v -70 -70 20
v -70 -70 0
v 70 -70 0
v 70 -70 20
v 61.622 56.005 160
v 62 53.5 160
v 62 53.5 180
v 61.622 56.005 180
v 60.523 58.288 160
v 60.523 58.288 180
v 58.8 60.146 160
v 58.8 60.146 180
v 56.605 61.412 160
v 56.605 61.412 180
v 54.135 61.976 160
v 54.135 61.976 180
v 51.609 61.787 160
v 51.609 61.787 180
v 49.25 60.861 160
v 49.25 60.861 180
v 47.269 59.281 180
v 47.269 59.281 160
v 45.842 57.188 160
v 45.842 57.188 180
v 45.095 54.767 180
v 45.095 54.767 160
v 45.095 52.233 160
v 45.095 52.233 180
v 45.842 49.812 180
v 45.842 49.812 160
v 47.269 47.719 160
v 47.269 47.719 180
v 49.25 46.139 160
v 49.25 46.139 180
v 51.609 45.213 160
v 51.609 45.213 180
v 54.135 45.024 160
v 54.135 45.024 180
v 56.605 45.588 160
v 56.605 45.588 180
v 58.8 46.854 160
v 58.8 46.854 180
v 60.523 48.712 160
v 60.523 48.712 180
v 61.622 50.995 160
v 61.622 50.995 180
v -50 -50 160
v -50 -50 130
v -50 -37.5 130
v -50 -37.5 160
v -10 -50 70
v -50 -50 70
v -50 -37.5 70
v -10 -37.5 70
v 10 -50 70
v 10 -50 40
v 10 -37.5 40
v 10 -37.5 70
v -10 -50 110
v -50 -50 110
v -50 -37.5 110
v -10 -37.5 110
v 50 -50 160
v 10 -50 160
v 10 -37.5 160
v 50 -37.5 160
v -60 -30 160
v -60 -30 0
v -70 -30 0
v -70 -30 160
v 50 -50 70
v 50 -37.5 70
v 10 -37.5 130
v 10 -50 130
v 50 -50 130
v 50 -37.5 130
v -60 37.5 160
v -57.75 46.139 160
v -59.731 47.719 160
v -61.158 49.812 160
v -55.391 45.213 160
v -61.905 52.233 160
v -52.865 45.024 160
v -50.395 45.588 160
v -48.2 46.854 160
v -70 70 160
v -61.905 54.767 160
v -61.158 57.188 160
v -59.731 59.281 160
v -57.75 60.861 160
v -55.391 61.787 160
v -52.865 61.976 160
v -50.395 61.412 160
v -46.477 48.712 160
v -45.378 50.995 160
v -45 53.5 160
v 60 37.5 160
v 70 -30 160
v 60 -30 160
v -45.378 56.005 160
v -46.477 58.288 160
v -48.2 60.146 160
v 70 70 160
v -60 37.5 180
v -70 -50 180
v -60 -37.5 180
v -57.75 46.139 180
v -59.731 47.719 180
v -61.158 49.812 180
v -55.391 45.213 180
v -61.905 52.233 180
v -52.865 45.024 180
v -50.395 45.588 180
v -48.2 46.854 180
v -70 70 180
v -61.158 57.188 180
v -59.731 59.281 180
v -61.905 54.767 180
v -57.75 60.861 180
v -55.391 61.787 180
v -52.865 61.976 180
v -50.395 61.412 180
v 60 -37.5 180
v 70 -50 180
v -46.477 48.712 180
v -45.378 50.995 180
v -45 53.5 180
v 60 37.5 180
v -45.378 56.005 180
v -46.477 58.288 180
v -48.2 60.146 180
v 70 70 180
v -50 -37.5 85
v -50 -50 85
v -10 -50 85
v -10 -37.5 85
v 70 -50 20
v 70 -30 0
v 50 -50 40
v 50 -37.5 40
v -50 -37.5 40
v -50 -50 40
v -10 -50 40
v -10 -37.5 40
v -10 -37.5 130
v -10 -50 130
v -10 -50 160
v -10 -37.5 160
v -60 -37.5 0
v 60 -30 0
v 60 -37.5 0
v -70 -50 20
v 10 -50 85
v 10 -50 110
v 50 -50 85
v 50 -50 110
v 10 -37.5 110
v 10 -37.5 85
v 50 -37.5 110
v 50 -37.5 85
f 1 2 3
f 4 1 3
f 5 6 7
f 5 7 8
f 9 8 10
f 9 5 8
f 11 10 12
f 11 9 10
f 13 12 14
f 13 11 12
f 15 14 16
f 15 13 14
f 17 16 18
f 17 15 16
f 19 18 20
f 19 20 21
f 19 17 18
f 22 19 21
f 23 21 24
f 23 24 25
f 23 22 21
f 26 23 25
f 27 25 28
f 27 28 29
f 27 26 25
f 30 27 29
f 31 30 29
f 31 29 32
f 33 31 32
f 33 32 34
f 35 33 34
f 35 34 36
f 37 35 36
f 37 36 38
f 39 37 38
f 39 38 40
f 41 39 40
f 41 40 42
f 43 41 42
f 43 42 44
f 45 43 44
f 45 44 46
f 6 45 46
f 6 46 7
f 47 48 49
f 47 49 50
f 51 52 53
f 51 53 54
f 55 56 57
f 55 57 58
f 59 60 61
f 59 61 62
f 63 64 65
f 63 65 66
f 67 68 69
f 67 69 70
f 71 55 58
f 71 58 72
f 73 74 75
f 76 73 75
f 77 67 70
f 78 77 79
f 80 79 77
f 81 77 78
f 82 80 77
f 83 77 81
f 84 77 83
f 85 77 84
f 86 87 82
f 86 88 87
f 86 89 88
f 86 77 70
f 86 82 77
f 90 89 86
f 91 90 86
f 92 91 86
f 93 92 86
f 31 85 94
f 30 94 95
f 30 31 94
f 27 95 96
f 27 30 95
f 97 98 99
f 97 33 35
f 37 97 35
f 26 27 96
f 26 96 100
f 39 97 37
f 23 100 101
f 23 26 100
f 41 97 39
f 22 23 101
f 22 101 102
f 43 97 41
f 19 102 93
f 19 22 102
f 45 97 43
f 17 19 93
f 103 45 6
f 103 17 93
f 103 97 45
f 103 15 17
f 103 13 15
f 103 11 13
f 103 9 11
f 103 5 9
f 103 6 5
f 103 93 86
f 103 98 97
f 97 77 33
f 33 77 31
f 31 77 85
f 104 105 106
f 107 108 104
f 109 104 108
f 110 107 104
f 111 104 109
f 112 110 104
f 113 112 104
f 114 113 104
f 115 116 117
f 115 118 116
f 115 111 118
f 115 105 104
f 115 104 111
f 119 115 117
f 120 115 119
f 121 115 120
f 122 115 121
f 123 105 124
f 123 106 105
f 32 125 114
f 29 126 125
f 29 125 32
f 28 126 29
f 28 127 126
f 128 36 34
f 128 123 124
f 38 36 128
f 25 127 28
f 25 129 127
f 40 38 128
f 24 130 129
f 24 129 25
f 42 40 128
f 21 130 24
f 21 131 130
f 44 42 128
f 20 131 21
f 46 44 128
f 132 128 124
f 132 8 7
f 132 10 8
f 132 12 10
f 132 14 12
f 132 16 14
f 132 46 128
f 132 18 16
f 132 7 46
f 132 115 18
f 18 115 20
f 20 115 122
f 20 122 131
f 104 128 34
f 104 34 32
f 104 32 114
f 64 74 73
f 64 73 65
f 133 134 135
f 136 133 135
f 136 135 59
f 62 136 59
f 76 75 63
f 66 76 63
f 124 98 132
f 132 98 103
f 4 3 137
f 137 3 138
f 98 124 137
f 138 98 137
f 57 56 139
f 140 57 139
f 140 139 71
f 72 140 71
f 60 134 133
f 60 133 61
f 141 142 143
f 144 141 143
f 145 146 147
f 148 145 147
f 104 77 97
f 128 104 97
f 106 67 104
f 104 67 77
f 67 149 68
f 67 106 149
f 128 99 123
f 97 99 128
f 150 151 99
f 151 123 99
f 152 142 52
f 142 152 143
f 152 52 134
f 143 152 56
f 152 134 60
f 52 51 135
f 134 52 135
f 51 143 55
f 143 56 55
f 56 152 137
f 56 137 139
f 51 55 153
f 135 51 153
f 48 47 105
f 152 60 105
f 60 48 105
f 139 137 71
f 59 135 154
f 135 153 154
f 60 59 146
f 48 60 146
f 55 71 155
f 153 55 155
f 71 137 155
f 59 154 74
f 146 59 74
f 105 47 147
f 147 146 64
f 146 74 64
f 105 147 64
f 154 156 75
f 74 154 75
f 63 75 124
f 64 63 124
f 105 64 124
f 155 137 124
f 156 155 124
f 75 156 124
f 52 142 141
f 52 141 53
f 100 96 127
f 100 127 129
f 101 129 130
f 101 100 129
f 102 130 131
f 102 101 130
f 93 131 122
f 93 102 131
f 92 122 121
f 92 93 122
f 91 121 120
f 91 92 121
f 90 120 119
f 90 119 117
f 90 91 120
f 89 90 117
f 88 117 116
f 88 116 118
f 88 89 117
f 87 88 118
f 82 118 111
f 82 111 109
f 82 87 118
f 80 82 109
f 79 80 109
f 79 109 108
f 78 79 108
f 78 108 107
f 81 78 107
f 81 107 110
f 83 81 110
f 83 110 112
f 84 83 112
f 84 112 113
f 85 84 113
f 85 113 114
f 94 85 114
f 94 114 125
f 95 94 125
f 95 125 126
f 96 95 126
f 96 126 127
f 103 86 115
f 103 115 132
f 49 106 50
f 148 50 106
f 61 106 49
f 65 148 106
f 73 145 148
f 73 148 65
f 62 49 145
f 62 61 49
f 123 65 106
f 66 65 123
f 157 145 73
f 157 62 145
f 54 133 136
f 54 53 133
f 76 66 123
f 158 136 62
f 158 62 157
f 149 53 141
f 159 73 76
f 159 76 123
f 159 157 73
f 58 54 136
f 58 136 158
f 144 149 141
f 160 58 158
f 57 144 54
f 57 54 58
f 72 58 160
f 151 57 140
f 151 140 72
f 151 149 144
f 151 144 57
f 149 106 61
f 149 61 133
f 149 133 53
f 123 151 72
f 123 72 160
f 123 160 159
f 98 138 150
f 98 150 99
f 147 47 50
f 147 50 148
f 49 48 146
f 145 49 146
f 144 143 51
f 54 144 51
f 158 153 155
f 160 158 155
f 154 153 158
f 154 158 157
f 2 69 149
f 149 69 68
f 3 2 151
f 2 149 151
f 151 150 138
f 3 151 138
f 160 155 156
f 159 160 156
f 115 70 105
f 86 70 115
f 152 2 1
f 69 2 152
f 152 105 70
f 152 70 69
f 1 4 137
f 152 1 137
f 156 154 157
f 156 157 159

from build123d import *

# Parameters (mm, degrees)
F0_W     = 140
F0_H     = 140
F0_R     = 8.5
F0_W_2   = 120
F0_H_2   = 75
F1_DEPTH = 180
F2_W     = 20
F2_H     = 160
F2_W_2   = 100
F3_DEPTH = 140
F4_W     = 40
F4_H     = 30
F4_H_2   = 25
F5_DEPTH = 20


# Not quite as in the source:
# - a feature names something its author has since deleted; it is built from what else it names


with BuildPart() as f1:
    # F0 (on Top) → F1 (new body)
    with BuildSketch(Plane.XY):
        Rectangle(F0_W, F0_H)
        with Locations((-53.5, 53.5)):
            Circle(F0_R, mode=Mode.SUBTRACT)
        Rectangle(F0_W_2, F0_H_2, mode=Mode.SUBTRACT)
        with Locations((53.5, 53.5)):
            Circle(F0_R, mode=Mode.SUBTRACT)
    extrude(amount=F1_DEPTH)

    # F2 (on face) → F3 (cut)
    with BuildSketch(Plane.YZ.offset(70)):
        with Locations((-60, 100)):
            Rectangle(F2_W, F2_H)
        with Locations((20, 80)):
            Rectangle(F2_W_2, F2_H)
    extrude(amount=-F3_DEPTH, mode=Mode.SUBTRACT)

    # F4 (on face) → F5 (cut)
    with BuildSketch(Plane.XZ.offset(50)):
        with Locations((-30, 145)):
            Rectangle(F4_W, F4_H)
        with Locations((30, 145)):
            Rectangle(F4_W, F4_H)
        with Locations((30, 55)):
            Rectangle(F4_W, F4_H)
        with Locations((-30, 55)):
            Rectangle(F4_W, F4_H)
        with Locations((-30, 97.5)):
            Rectangle(F4_W, F4_H_2)
        with Locations((30, 97.5)):
            Rectangle(F4_W, F4_H_2)
    extrude(amount=-F5_DEPTH, mode=Mode.SUBTRACT)


solid = f1.part
